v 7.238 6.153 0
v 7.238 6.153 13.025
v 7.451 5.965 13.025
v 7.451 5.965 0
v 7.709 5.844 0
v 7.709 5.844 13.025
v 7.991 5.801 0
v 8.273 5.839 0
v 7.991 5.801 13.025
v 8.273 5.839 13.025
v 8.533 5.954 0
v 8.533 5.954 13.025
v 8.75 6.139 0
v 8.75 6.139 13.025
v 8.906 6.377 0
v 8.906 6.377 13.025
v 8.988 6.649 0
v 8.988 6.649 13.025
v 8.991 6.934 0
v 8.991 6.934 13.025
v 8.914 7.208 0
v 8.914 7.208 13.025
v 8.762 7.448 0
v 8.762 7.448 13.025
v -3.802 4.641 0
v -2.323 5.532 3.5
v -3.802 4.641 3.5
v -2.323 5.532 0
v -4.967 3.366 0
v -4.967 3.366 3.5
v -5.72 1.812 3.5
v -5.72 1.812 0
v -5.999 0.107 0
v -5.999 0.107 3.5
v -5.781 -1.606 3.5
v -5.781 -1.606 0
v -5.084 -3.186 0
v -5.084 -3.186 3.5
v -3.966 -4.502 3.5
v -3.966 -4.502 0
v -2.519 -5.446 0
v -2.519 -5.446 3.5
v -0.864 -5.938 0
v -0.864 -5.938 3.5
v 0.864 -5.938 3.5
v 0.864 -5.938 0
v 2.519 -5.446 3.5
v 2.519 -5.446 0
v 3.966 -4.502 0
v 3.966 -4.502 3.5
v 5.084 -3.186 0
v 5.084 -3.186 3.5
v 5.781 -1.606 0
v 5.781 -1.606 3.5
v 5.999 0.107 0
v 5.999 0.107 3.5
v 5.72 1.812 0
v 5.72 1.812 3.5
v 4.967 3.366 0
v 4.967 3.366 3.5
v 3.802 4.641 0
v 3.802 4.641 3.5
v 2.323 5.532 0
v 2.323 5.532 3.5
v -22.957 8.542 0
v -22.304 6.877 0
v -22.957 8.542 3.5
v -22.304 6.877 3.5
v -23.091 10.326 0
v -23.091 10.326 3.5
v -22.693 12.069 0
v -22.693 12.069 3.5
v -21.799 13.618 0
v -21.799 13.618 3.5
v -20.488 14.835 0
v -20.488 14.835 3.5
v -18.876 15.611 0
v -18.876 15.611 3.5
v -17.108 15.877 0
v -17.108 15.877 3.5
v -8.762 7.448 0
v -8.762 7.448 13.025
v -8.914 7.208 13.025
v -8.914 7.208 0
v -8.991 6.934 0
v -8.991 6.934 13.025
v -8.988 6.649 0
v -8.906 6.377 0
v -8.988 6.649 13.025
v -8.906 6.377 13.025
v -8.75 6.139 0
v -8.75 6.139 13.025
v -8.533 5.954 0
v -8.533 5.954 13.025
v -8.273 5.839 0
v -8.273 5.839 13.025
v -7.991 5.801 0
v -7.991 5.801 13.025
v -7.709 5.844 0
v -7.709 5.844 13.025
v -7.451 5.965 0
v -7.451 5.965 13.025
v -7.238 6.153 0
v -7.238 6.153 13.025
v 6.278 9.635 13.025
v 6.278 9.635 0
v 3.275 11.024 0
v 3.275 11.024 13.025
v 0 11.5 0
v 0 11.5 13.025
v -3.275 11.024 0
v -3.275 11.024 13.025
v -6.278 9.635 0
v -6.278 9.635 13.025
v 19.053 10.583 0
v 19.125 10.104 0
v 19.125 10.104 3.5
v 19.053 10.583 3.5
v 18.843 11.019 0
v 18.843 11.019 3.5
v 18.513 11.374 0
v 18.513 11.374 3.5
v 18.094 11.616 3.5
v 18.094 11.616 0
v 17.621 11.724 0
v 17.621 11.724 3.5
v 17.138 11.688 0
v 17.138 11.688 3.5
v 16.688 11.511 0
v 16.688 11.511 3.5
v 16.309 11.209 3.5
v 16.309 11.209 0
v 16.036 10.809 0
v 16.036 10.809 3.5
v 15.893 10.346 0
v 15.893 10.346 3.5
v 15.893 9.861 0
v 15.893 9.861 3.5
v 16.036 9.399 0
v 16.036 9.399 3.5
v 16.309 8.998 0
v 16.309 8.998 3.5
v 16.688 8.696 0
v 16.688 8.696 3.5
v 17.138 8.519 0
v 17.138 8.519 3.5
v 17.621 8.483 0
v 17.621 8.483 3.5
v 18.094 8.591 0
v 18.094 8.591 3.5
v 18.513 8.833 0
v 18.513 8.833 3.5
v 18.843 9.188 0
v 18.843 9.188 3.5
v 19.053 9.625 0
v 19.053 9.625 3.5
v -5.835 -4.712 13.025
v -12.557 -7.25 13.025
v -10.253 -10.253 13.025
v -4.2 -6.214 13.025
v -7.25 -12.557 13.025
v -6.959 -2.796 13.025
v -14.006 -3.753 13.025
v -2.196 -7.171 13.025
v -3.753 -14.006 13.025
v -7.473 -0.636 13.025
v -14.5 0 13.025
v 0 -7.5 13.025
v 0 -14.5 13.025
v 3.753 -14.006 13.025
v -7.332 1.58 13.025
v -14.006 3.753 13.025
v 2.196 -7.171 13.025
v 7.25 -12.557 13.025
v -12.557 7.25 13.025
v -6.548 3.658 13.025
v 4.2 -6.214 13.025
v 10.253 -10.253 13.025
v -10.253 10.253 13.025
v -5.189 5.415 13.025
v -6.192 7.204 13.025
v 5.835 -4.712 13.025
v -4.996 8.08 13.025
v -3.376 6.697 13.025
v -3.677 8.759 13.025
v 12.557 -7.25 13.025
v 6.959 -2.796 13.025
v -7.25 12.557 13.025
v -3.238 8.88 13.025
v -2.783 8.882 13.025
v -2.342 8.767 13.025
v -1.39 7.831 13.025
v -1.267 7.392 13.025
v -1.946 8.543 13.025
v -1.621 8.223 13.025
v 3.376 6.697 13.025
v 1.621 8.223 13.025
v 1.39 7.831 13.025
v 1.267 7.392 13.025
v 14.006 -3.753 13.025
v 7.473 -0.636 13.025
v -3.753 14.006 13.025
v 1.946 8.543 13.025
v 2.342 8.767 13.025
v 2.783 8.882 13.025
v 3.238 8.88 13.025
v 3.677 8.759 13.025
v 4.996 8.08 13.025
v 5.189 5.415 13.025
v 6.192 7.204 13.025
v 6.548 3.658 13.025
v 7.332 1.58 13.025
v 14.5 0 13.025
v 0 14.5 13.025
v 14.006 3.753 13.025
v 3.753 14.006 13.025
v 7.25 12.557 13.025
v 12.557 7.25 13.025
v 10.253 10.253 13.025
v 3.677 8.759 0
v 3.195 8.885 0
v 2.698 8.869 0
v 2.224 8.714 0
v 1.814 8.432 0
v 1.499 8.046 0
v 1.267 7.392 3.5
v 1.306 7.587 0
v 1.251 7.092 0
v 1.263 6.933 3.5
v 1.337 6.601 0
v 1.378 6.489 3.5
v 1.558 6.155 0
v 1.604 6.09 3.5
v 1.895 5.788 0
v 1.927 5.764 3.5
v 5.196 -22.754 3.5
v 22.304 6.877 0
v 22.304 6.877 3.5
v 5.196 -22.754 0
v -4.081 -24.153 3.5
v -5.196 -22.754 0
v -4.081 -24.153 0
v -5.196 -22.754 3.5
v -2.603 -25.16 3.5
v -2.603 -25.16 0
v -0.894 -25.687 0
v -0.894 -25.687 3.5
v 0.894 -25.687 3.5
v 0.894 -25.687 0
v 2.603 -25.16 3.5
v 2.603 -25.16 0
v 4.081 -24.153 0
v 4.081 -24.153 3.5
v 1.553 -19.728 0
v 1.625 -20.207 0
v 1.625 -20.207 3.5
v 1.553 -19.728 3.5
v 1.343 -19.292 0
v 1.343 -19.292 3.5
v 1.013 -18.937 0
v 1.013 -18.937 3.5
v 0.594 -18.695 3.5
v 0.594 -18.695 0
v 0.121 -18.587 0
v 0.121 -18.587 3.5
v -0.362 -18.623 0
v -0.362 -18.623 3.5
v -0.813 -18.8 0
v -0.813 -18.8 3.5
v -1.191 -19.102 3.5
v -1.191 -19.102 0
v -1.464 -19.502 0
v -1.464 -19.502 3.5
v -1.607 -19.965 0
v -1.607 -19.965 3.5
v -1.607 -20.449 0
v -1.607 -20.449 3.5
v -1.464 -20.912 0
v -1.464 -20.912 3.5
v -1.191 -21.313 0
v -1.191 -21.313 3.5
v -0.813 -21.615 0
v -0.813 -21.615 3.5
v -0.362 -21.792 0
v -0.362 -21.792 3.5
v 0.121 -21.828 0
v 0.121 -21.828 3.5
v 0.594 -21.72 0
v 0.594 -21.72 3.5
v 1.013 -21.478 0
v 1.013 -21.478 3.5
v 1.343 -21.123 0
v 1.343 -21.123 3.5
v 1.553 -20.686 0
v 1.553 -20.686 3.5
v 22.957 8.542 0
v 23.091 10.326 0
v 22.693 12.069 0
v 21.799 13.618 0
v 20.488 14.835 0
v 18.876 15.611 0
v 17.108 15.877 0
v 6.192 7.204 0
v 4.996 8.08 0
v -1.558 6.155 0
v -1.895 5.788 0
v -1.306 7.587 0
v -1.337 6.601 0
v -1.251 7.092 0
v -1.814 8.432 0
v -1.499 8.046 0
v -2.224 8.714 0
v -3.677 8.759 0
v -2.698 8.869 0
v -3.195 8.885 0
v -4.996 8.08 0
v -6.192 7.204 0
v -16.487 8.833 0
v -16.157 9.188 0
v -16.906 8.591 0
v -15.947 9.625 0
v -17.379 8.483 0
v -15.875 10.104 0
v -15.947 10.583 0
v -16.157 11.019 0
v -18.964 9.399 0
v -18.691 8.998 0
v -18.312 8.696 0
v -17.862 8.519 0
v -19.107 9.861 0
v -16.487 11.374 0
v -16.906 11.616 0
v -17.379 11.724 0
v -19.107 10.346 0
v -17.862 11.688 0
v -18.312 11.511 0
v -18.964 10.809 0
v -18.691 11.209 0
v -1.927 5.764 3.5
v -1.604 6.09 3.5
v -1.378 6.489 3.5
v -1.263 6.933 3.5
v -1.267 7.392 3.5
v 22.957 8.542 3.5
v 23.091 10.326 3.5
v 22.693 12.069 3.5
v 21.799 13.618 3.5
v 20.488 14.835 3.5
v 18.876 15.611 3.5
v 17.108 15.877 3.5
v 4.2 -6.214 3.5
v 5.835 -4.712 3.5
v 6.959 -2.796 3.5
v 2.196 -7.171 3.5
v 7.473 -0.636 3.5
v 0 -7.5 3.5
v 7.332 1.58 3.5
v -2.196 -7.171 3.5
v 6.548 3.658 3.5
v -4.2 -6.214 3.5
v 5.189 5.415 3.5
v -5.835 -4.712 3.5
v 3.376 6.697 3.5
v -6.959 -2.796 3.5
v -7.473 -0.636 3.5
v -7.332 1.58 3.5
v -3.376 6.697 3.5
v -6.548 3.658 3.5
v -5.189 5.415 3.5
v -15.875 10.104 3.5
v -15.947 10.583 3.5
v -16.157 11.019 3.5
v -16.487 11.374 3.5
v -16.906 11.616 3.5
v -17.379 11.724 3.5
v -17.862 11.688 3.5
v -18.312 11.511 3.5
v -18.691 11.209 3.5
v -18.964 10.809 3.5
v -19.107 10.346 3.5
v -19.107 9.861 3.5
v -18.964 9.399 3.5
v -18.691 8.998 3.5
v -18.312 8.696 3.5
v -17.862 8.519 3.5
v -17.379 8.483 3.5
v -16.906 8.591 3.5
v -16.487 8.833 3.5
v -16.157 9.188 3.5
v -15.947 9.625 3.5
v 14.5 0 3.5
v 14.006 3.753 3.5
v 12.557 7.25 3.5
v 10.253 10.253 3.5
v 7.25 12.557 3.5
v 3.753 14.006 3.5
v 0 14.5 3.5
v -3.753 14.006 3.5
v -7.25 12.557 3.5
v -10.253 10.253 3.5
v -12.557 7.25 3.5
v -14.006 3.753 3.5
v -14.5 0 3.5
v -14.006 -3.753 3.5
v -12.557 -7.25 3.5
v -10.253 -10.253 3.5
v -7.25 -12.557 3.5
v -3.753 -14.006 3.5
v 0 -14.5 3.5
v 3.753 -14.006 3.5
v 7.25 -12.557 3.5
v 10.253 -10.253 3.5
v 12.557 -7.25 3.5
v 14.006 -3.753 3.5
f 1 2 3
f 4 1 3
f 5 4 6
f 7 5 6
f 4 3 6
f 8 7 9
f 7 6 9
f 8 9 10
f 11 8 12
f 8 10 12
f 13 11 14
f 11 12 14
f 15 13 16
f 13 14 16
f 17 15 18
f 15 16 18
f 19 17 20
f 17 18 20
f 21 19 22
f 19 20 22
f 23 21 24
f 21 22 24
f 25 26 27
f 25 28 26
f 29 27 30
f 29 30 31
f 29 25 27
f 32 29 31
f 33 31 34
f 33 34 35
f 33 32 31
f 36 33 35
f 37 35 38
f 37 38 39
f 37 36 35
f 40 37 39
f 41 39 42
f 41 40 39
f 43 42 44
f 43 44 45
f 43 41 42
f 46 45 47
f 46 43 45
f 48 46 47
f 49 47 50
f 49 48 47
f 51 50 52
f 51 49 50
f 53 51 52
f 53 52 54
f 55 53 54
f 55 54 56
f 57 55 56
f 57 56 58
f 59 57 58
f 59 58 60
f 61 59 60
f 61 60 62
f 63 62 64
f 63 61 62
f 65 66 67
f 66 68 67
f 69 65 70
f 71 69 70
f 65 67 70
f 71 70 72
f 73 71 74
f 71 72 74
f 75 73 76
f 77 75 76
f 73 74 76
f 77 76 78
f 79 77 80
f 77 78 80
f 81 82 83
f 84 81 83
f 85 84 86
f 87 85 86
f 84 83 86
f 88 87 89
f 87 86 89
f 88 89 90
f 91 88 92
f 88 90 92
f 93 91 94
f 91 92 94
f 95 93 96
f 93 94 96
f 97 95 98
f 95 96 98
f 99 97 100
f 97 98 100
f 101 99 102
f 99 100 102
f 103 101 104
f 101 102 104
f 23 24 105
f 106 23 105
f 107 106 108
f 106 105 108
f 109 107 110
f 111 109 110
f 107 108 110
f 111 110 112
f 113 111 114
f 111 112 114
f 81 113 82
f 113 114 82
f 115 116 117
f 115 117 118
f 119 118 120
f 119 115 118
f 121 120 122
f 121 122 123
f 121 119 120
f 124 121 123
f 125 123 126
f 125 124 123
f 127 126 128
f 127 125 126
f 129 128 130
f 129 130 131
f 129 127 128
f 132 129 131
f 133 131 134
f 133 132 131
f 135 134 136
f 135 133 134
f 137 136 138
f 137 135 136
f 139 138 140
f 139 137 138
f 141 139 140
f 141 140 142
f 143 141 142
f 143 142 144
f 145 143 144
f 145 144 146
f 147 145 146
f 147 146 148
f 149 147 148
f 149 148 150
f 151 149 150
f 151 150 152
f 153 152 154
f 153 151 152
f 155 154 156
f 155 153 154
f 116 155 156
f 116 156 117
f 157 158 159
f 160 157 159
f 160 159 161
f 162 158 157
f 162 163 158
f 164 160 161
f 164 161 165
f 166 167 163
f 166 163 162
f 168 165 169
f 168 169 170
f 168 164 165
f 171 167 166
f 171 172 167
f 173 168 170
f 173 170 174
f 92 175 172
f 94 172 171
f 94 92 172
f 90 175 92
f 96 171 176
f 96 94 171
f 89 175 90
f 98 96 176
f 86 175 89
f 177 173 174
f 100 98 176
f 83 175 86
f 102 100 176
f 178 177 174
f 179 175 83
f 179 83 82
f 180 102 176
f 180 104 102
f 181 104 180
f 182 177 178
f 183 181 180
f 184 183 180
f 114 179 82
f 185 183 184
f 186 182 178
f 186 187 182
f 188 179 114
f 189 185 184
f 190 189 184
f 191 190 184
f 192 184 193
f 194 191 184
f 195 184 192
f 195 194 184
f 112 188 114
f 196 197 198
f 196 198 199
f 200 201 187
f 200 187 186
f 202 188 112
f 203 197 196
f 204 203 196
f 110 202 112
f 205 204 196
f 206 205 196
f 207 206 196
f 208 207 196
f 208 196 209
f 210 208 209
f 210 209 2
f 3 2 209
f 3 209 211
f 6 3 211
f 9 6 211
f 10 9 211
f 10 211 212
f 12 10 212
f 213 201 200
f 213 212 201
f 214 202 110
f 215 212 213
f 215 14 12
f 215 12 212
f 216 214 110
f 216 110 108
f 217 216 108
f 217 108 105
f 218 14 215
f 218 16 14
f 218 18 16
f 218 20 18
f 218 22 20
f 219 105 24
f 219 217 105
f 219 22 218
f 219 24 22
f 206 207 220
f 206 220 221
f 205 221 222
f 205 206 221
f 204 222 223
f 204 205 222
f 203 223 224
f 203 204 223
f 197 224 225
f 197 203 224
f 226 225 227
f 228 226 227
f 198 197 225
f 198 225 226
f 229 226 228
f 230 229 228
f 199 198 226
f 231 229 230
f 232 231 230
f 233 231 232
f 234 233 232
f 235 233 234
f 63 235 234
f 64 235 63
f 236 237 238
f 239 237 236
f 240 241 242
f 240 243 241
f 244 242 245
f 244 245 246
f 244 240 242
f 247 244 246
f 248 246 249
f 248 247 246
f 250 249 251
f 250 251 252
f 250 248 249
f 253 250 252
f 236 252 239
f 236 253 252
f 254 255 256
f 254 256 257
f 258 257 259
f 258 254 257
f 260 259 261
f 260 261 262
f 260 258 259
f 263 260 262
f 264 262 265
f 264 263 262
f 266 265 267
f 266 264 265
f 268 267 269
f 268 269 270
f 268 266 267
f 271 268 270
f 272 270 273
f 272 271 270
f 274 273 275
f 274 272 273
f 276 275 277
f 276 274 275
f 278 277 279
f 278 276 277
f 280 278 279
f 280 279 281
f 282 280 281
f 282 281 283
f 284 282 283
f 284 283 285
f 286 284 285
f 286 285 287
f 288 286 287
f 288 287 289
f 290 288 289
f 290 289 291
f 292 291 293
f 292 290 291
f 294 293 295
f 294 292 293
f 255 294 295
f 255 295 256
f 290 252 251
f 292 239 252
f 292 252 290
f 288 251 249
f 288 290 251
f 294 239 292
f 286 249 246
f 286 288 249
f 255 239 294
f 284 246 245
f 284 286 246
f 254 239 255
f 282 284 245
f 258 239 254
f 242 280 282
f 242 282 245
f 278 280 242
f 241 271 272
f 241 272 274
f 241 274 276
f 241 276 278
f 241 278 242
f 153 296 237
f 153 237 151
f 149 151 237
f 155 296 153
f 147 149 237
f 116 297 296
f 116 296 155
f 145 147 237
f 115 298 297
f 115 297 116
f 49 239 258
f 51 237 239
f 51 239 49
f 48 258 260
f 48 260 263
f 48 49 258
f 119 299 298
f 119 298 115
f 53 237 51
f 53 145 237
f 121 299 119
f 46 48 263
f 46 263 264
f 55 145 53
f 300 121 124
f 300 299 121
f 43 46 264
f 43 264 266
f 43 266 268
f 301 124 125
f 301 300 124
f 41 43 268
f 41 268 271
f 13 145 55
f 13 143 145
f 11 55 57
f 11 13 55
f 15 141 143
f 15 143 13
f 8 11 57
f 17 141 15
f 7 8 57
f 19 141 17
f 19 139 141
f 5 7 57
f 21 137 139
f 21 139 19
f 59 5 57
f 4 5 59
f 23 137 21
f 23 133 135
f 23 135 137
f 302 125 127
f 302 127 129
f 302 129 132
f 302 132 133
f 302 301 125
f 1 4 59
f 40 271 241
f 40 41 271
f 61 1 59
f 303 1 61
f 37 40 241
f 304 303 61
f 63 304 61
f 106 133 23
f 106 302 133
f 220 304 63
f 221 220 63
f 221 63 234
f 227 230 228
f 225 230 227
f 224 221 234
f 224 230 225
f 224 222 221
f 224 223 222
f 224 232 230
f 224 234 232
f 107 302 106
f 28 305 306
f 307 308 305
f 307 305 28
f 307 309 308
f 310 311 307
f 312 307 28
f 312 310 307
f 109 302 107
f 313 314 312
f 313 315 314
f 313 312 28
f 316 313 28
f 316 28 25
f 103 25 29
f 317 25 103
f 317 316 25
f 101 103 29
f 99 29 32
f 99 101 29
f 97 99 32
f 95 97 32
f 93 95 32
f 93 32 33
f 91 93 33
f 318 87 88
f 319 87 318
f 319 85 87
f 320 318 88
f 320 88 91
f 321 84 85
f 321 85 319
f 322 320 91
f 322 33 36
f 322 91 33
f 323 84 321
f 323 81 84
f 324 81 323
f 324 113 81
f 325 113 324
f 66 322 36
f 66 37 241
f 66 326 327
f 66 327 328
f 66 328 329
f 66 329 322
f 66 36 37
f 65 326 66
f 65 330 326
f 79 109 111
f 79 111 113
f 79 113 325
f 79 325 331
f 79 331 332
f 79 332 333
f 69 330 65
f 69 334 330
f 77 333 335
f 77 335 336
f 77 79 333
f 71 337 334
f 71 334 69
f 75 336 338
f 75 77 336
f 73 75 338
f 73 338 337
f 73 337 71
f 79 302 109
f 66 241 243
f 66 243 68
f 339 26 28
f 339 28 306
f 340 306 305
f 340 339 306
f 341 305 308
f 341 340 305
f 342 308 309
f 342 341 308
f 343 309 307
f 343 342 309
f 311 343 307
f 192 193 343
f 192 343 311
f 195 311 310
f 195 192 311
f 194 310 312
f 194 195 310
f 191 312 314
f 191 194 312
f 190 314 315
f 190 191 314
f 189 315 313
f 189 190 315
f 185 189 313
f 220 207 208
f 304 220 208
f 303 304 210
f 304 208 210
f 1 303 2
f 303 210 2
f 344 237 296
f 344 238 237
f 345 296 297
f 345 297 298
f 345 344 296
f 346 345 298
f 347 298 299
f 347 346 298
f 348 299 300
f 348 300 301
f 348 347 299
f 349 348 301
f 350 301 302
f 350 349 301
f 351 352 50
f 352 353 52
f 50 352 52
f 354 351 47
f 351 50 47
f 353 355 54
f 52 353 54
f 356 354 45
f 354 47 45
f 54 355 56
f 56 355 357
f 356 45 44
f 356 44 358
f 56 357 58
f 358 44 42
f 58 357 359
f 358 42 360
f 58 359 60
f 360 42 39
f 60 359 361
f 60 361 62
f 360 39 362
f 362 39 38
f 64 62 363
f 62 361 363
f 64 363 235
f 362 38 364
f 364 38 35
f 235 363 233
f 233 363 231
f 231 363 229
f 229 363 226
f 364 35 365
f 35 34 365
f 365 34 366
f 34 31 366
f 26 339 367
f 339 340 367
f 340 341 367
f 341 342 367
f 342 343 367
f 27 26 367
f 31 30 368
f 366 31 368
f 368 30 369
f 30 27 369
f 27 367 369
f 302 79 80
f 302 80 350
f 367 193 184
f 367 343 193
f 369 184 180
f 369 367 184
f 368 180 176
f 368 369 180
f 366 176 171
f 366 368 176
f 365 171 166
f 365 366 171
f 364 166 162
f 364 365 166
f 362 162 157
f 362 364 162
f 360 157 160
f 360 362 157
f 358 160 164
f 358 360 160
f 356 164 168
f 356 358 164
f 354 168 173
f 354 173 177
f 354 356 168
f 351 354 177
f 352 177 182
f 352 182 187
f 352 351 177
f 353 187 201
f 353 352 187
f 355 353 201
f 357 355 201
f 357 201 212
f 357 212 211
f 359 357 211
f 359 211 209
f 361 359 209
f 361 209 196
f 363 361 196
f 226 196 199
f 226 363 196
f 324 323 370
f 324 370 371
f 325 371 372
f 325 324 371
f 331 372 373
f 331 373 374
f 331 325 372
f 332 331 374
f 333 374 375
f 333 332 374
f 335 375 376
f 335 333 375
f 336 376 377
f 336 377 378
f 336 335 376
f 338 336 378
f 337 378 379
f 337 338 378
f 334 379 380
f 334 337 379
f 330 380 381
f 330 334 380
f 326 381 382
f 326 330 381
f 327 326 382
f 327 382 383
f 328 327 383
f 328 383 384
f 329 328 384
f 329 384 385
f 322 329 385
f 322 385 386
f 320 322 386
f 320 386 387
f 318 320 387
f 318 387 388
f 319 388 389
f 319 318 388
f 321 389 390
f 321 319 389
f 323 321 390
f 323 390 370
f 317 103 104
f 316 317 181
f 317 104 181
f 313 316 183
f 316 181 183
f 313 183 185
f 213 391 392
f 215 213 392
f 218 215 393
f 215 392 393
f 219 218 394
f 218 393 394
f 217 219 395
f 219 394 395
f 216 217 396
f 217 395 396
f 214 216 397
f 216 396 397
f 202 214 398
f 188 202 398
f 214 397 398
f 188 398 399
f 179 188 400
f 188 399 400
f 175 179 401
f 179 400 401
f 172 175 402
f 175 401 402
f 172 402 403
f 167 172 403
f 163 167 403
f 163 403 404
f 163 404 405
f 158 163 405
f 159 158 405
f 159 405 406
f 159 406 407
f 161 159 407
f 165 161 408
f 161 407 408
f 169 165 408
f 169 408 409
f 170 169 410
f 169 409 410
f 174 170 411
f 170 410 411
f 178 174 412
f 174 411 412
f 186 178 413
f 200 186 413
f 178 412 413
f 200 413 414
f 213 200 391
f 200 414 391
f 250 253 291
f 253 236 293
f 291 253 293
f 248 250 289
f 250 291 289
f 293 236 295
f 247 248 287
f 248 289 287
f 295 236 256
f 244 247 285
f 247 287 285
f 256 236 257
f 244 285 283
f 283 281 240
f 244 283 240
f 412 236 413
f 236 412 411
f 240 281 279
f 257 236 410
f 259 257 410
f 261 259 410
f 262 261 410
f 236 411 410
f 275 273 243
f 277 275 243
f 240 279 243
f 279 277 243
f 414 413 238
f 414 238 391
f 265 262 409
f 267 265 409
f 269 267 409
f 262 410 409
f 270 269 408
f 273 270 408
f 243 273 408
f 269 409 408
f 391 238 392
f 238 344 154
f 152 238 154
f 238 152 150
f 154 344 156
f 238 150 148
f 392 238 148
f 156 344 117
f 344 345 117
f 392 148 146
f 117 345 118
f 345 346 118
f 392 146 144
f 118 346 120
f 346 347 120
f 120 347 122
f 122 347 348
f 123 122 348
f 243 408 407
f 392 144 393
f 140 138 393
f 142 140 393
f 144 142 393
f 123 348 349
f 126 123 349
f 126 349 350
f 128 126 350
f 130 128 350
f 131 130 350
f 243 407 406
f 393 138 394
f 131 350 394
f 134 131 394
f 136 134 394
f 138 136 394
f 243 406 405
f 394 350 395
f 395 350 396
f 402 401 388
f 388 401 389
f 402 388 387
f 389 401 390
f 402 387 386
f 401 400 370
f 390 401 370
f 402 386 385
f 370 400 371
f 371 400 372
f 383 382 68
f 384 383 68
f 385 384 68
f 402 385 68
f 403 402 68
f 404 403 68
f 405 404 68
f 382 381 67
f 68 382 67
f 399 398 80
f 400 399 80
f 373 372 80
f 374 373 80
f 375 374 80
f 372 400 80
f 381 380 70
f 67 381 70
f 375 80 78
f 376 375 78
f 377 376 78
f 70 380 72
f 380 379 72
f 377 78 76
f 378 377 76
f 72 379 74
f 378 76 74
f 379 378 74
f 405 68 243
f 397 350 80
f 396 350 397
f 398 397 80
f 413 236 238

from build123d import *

# Parameters (mm, degrees)
ESQUISSE3_R             = 1.625
ESQUISSE3_R_2           = 6
BOSS_EXTRU_1_DEPTH      = 3.5
ESQUISSE4_R             = 14.5
ESQUISSE4_R_2           = 7.5
BOSS_EXTRU_2_DEPTH      = 9.525
CONG_3_R                = 6
ENL_V_MAT_EXTRU_1_DEPTH = 37.971588497
ENL_V_MAT_EXTRU_2_DEPTH = 37.971588497


with BuildPart() as part:
    # Esquisse3 → Boss.-Extru.1 (new body)
    with BuildSketch(Plane.XY):
        Polygon((0, -31.754264805), (-27.5, 15.877132403), (27.5, 15.877132403), align=None)
        with Locations((-17.5, 10.103629711)):
            Circle(ESQUISSE3_R, mode=Mode.SUBTRACT)
        with Locations((17.5, 10.103629711)):
            Circle(ESQUISSE3_R, mode=Mode.SUBTRACT)
        with Locations((0, -20.207259422)):
            Circle(ESQUISSE3_R, mode=Mode.SUBTRACT)
        Circle(ESQUISSE3_R_2, mode=Mode.SUBTRACT)
    extrude(amount=BOSS_EXTRU_1_DEPTH)

    # Esquisse4 → Boss.-Extru.2 (add)
    with BuildSketch(Plane.XY.offset(3.5)):
        Circle(ESQUISSE4_R)
        Circle(ESQUISSE4_R_2, mode=Mode.SUBTRACT)
    extrude(amount=BOSS_EXTRU_2_DEPTH)

    # Congé3
    cong_3_edges = [part.edges().sort_by_distance(p)[0] for p in [
        (0, -31.754264805, 1.75),
        (-27.5, 15.877132403, 1.75),
        (27.5, 15.877132403, 1.75),
    ]]
    fillet(cong_3_edges, radius=CONG_3_R)

    # Esquisse5 → Enlèv. mat.-Extru.1 (cut, through all)
    with BuildSketch(Plane.XY.offset(13.025)):
        with BuildLine():
            ThreePointArc((-7.238095238, 6.153046183), (0, 9.5), (7.238095238, 6.153046183))
            ThreePointArc((7.238095238, 6.153046183), (8.647689072, 6.038830492), (8.761904762, 7.448424326))
            ThreePointArc((8.761904762, 7.448424326), (0, 11.5), (-8.761904762, 7.448424326))
            ThreePointArc((-8.761904762, 7.448424326), (-8.647689072, 6.038830492), (-7.238095238, 6.153046183))
        make_face()
    extrude(amount=-ENL_V_MAT_EXTRU_1_DEPTH, mode=Mode.SUBTRACT)

    # Esquisse6 → Enlèv. mat.-Extru.2 (cut, through all)
    with BuildSketch(Plane.XY.offset(13.025)):
        with BuildLine():
            ThreePointArc((-2.322580645, 5.532234553), (-1.386431589, 7.823222319), (-3.677419355, 8.759371375))
            ThreePointArc((-3.677419355, 8.759371375), (0, 9.5), (3.677419355, 8.759371375))
            ThreePointArc((3.677419355, 8.759371375), (1.386431589, 7.823222319), (2.322580645, 5.532234553))
            ThreePointArc((2.322580645, 5.532234553), (0, 6), (-2.322580645, 5.532234553))
        make_face()
    extrude(amount=-ENL_V_MAT_EXTRU_2_DEPTH, mode=Mode.SUBTRACT)


solid = part.part
